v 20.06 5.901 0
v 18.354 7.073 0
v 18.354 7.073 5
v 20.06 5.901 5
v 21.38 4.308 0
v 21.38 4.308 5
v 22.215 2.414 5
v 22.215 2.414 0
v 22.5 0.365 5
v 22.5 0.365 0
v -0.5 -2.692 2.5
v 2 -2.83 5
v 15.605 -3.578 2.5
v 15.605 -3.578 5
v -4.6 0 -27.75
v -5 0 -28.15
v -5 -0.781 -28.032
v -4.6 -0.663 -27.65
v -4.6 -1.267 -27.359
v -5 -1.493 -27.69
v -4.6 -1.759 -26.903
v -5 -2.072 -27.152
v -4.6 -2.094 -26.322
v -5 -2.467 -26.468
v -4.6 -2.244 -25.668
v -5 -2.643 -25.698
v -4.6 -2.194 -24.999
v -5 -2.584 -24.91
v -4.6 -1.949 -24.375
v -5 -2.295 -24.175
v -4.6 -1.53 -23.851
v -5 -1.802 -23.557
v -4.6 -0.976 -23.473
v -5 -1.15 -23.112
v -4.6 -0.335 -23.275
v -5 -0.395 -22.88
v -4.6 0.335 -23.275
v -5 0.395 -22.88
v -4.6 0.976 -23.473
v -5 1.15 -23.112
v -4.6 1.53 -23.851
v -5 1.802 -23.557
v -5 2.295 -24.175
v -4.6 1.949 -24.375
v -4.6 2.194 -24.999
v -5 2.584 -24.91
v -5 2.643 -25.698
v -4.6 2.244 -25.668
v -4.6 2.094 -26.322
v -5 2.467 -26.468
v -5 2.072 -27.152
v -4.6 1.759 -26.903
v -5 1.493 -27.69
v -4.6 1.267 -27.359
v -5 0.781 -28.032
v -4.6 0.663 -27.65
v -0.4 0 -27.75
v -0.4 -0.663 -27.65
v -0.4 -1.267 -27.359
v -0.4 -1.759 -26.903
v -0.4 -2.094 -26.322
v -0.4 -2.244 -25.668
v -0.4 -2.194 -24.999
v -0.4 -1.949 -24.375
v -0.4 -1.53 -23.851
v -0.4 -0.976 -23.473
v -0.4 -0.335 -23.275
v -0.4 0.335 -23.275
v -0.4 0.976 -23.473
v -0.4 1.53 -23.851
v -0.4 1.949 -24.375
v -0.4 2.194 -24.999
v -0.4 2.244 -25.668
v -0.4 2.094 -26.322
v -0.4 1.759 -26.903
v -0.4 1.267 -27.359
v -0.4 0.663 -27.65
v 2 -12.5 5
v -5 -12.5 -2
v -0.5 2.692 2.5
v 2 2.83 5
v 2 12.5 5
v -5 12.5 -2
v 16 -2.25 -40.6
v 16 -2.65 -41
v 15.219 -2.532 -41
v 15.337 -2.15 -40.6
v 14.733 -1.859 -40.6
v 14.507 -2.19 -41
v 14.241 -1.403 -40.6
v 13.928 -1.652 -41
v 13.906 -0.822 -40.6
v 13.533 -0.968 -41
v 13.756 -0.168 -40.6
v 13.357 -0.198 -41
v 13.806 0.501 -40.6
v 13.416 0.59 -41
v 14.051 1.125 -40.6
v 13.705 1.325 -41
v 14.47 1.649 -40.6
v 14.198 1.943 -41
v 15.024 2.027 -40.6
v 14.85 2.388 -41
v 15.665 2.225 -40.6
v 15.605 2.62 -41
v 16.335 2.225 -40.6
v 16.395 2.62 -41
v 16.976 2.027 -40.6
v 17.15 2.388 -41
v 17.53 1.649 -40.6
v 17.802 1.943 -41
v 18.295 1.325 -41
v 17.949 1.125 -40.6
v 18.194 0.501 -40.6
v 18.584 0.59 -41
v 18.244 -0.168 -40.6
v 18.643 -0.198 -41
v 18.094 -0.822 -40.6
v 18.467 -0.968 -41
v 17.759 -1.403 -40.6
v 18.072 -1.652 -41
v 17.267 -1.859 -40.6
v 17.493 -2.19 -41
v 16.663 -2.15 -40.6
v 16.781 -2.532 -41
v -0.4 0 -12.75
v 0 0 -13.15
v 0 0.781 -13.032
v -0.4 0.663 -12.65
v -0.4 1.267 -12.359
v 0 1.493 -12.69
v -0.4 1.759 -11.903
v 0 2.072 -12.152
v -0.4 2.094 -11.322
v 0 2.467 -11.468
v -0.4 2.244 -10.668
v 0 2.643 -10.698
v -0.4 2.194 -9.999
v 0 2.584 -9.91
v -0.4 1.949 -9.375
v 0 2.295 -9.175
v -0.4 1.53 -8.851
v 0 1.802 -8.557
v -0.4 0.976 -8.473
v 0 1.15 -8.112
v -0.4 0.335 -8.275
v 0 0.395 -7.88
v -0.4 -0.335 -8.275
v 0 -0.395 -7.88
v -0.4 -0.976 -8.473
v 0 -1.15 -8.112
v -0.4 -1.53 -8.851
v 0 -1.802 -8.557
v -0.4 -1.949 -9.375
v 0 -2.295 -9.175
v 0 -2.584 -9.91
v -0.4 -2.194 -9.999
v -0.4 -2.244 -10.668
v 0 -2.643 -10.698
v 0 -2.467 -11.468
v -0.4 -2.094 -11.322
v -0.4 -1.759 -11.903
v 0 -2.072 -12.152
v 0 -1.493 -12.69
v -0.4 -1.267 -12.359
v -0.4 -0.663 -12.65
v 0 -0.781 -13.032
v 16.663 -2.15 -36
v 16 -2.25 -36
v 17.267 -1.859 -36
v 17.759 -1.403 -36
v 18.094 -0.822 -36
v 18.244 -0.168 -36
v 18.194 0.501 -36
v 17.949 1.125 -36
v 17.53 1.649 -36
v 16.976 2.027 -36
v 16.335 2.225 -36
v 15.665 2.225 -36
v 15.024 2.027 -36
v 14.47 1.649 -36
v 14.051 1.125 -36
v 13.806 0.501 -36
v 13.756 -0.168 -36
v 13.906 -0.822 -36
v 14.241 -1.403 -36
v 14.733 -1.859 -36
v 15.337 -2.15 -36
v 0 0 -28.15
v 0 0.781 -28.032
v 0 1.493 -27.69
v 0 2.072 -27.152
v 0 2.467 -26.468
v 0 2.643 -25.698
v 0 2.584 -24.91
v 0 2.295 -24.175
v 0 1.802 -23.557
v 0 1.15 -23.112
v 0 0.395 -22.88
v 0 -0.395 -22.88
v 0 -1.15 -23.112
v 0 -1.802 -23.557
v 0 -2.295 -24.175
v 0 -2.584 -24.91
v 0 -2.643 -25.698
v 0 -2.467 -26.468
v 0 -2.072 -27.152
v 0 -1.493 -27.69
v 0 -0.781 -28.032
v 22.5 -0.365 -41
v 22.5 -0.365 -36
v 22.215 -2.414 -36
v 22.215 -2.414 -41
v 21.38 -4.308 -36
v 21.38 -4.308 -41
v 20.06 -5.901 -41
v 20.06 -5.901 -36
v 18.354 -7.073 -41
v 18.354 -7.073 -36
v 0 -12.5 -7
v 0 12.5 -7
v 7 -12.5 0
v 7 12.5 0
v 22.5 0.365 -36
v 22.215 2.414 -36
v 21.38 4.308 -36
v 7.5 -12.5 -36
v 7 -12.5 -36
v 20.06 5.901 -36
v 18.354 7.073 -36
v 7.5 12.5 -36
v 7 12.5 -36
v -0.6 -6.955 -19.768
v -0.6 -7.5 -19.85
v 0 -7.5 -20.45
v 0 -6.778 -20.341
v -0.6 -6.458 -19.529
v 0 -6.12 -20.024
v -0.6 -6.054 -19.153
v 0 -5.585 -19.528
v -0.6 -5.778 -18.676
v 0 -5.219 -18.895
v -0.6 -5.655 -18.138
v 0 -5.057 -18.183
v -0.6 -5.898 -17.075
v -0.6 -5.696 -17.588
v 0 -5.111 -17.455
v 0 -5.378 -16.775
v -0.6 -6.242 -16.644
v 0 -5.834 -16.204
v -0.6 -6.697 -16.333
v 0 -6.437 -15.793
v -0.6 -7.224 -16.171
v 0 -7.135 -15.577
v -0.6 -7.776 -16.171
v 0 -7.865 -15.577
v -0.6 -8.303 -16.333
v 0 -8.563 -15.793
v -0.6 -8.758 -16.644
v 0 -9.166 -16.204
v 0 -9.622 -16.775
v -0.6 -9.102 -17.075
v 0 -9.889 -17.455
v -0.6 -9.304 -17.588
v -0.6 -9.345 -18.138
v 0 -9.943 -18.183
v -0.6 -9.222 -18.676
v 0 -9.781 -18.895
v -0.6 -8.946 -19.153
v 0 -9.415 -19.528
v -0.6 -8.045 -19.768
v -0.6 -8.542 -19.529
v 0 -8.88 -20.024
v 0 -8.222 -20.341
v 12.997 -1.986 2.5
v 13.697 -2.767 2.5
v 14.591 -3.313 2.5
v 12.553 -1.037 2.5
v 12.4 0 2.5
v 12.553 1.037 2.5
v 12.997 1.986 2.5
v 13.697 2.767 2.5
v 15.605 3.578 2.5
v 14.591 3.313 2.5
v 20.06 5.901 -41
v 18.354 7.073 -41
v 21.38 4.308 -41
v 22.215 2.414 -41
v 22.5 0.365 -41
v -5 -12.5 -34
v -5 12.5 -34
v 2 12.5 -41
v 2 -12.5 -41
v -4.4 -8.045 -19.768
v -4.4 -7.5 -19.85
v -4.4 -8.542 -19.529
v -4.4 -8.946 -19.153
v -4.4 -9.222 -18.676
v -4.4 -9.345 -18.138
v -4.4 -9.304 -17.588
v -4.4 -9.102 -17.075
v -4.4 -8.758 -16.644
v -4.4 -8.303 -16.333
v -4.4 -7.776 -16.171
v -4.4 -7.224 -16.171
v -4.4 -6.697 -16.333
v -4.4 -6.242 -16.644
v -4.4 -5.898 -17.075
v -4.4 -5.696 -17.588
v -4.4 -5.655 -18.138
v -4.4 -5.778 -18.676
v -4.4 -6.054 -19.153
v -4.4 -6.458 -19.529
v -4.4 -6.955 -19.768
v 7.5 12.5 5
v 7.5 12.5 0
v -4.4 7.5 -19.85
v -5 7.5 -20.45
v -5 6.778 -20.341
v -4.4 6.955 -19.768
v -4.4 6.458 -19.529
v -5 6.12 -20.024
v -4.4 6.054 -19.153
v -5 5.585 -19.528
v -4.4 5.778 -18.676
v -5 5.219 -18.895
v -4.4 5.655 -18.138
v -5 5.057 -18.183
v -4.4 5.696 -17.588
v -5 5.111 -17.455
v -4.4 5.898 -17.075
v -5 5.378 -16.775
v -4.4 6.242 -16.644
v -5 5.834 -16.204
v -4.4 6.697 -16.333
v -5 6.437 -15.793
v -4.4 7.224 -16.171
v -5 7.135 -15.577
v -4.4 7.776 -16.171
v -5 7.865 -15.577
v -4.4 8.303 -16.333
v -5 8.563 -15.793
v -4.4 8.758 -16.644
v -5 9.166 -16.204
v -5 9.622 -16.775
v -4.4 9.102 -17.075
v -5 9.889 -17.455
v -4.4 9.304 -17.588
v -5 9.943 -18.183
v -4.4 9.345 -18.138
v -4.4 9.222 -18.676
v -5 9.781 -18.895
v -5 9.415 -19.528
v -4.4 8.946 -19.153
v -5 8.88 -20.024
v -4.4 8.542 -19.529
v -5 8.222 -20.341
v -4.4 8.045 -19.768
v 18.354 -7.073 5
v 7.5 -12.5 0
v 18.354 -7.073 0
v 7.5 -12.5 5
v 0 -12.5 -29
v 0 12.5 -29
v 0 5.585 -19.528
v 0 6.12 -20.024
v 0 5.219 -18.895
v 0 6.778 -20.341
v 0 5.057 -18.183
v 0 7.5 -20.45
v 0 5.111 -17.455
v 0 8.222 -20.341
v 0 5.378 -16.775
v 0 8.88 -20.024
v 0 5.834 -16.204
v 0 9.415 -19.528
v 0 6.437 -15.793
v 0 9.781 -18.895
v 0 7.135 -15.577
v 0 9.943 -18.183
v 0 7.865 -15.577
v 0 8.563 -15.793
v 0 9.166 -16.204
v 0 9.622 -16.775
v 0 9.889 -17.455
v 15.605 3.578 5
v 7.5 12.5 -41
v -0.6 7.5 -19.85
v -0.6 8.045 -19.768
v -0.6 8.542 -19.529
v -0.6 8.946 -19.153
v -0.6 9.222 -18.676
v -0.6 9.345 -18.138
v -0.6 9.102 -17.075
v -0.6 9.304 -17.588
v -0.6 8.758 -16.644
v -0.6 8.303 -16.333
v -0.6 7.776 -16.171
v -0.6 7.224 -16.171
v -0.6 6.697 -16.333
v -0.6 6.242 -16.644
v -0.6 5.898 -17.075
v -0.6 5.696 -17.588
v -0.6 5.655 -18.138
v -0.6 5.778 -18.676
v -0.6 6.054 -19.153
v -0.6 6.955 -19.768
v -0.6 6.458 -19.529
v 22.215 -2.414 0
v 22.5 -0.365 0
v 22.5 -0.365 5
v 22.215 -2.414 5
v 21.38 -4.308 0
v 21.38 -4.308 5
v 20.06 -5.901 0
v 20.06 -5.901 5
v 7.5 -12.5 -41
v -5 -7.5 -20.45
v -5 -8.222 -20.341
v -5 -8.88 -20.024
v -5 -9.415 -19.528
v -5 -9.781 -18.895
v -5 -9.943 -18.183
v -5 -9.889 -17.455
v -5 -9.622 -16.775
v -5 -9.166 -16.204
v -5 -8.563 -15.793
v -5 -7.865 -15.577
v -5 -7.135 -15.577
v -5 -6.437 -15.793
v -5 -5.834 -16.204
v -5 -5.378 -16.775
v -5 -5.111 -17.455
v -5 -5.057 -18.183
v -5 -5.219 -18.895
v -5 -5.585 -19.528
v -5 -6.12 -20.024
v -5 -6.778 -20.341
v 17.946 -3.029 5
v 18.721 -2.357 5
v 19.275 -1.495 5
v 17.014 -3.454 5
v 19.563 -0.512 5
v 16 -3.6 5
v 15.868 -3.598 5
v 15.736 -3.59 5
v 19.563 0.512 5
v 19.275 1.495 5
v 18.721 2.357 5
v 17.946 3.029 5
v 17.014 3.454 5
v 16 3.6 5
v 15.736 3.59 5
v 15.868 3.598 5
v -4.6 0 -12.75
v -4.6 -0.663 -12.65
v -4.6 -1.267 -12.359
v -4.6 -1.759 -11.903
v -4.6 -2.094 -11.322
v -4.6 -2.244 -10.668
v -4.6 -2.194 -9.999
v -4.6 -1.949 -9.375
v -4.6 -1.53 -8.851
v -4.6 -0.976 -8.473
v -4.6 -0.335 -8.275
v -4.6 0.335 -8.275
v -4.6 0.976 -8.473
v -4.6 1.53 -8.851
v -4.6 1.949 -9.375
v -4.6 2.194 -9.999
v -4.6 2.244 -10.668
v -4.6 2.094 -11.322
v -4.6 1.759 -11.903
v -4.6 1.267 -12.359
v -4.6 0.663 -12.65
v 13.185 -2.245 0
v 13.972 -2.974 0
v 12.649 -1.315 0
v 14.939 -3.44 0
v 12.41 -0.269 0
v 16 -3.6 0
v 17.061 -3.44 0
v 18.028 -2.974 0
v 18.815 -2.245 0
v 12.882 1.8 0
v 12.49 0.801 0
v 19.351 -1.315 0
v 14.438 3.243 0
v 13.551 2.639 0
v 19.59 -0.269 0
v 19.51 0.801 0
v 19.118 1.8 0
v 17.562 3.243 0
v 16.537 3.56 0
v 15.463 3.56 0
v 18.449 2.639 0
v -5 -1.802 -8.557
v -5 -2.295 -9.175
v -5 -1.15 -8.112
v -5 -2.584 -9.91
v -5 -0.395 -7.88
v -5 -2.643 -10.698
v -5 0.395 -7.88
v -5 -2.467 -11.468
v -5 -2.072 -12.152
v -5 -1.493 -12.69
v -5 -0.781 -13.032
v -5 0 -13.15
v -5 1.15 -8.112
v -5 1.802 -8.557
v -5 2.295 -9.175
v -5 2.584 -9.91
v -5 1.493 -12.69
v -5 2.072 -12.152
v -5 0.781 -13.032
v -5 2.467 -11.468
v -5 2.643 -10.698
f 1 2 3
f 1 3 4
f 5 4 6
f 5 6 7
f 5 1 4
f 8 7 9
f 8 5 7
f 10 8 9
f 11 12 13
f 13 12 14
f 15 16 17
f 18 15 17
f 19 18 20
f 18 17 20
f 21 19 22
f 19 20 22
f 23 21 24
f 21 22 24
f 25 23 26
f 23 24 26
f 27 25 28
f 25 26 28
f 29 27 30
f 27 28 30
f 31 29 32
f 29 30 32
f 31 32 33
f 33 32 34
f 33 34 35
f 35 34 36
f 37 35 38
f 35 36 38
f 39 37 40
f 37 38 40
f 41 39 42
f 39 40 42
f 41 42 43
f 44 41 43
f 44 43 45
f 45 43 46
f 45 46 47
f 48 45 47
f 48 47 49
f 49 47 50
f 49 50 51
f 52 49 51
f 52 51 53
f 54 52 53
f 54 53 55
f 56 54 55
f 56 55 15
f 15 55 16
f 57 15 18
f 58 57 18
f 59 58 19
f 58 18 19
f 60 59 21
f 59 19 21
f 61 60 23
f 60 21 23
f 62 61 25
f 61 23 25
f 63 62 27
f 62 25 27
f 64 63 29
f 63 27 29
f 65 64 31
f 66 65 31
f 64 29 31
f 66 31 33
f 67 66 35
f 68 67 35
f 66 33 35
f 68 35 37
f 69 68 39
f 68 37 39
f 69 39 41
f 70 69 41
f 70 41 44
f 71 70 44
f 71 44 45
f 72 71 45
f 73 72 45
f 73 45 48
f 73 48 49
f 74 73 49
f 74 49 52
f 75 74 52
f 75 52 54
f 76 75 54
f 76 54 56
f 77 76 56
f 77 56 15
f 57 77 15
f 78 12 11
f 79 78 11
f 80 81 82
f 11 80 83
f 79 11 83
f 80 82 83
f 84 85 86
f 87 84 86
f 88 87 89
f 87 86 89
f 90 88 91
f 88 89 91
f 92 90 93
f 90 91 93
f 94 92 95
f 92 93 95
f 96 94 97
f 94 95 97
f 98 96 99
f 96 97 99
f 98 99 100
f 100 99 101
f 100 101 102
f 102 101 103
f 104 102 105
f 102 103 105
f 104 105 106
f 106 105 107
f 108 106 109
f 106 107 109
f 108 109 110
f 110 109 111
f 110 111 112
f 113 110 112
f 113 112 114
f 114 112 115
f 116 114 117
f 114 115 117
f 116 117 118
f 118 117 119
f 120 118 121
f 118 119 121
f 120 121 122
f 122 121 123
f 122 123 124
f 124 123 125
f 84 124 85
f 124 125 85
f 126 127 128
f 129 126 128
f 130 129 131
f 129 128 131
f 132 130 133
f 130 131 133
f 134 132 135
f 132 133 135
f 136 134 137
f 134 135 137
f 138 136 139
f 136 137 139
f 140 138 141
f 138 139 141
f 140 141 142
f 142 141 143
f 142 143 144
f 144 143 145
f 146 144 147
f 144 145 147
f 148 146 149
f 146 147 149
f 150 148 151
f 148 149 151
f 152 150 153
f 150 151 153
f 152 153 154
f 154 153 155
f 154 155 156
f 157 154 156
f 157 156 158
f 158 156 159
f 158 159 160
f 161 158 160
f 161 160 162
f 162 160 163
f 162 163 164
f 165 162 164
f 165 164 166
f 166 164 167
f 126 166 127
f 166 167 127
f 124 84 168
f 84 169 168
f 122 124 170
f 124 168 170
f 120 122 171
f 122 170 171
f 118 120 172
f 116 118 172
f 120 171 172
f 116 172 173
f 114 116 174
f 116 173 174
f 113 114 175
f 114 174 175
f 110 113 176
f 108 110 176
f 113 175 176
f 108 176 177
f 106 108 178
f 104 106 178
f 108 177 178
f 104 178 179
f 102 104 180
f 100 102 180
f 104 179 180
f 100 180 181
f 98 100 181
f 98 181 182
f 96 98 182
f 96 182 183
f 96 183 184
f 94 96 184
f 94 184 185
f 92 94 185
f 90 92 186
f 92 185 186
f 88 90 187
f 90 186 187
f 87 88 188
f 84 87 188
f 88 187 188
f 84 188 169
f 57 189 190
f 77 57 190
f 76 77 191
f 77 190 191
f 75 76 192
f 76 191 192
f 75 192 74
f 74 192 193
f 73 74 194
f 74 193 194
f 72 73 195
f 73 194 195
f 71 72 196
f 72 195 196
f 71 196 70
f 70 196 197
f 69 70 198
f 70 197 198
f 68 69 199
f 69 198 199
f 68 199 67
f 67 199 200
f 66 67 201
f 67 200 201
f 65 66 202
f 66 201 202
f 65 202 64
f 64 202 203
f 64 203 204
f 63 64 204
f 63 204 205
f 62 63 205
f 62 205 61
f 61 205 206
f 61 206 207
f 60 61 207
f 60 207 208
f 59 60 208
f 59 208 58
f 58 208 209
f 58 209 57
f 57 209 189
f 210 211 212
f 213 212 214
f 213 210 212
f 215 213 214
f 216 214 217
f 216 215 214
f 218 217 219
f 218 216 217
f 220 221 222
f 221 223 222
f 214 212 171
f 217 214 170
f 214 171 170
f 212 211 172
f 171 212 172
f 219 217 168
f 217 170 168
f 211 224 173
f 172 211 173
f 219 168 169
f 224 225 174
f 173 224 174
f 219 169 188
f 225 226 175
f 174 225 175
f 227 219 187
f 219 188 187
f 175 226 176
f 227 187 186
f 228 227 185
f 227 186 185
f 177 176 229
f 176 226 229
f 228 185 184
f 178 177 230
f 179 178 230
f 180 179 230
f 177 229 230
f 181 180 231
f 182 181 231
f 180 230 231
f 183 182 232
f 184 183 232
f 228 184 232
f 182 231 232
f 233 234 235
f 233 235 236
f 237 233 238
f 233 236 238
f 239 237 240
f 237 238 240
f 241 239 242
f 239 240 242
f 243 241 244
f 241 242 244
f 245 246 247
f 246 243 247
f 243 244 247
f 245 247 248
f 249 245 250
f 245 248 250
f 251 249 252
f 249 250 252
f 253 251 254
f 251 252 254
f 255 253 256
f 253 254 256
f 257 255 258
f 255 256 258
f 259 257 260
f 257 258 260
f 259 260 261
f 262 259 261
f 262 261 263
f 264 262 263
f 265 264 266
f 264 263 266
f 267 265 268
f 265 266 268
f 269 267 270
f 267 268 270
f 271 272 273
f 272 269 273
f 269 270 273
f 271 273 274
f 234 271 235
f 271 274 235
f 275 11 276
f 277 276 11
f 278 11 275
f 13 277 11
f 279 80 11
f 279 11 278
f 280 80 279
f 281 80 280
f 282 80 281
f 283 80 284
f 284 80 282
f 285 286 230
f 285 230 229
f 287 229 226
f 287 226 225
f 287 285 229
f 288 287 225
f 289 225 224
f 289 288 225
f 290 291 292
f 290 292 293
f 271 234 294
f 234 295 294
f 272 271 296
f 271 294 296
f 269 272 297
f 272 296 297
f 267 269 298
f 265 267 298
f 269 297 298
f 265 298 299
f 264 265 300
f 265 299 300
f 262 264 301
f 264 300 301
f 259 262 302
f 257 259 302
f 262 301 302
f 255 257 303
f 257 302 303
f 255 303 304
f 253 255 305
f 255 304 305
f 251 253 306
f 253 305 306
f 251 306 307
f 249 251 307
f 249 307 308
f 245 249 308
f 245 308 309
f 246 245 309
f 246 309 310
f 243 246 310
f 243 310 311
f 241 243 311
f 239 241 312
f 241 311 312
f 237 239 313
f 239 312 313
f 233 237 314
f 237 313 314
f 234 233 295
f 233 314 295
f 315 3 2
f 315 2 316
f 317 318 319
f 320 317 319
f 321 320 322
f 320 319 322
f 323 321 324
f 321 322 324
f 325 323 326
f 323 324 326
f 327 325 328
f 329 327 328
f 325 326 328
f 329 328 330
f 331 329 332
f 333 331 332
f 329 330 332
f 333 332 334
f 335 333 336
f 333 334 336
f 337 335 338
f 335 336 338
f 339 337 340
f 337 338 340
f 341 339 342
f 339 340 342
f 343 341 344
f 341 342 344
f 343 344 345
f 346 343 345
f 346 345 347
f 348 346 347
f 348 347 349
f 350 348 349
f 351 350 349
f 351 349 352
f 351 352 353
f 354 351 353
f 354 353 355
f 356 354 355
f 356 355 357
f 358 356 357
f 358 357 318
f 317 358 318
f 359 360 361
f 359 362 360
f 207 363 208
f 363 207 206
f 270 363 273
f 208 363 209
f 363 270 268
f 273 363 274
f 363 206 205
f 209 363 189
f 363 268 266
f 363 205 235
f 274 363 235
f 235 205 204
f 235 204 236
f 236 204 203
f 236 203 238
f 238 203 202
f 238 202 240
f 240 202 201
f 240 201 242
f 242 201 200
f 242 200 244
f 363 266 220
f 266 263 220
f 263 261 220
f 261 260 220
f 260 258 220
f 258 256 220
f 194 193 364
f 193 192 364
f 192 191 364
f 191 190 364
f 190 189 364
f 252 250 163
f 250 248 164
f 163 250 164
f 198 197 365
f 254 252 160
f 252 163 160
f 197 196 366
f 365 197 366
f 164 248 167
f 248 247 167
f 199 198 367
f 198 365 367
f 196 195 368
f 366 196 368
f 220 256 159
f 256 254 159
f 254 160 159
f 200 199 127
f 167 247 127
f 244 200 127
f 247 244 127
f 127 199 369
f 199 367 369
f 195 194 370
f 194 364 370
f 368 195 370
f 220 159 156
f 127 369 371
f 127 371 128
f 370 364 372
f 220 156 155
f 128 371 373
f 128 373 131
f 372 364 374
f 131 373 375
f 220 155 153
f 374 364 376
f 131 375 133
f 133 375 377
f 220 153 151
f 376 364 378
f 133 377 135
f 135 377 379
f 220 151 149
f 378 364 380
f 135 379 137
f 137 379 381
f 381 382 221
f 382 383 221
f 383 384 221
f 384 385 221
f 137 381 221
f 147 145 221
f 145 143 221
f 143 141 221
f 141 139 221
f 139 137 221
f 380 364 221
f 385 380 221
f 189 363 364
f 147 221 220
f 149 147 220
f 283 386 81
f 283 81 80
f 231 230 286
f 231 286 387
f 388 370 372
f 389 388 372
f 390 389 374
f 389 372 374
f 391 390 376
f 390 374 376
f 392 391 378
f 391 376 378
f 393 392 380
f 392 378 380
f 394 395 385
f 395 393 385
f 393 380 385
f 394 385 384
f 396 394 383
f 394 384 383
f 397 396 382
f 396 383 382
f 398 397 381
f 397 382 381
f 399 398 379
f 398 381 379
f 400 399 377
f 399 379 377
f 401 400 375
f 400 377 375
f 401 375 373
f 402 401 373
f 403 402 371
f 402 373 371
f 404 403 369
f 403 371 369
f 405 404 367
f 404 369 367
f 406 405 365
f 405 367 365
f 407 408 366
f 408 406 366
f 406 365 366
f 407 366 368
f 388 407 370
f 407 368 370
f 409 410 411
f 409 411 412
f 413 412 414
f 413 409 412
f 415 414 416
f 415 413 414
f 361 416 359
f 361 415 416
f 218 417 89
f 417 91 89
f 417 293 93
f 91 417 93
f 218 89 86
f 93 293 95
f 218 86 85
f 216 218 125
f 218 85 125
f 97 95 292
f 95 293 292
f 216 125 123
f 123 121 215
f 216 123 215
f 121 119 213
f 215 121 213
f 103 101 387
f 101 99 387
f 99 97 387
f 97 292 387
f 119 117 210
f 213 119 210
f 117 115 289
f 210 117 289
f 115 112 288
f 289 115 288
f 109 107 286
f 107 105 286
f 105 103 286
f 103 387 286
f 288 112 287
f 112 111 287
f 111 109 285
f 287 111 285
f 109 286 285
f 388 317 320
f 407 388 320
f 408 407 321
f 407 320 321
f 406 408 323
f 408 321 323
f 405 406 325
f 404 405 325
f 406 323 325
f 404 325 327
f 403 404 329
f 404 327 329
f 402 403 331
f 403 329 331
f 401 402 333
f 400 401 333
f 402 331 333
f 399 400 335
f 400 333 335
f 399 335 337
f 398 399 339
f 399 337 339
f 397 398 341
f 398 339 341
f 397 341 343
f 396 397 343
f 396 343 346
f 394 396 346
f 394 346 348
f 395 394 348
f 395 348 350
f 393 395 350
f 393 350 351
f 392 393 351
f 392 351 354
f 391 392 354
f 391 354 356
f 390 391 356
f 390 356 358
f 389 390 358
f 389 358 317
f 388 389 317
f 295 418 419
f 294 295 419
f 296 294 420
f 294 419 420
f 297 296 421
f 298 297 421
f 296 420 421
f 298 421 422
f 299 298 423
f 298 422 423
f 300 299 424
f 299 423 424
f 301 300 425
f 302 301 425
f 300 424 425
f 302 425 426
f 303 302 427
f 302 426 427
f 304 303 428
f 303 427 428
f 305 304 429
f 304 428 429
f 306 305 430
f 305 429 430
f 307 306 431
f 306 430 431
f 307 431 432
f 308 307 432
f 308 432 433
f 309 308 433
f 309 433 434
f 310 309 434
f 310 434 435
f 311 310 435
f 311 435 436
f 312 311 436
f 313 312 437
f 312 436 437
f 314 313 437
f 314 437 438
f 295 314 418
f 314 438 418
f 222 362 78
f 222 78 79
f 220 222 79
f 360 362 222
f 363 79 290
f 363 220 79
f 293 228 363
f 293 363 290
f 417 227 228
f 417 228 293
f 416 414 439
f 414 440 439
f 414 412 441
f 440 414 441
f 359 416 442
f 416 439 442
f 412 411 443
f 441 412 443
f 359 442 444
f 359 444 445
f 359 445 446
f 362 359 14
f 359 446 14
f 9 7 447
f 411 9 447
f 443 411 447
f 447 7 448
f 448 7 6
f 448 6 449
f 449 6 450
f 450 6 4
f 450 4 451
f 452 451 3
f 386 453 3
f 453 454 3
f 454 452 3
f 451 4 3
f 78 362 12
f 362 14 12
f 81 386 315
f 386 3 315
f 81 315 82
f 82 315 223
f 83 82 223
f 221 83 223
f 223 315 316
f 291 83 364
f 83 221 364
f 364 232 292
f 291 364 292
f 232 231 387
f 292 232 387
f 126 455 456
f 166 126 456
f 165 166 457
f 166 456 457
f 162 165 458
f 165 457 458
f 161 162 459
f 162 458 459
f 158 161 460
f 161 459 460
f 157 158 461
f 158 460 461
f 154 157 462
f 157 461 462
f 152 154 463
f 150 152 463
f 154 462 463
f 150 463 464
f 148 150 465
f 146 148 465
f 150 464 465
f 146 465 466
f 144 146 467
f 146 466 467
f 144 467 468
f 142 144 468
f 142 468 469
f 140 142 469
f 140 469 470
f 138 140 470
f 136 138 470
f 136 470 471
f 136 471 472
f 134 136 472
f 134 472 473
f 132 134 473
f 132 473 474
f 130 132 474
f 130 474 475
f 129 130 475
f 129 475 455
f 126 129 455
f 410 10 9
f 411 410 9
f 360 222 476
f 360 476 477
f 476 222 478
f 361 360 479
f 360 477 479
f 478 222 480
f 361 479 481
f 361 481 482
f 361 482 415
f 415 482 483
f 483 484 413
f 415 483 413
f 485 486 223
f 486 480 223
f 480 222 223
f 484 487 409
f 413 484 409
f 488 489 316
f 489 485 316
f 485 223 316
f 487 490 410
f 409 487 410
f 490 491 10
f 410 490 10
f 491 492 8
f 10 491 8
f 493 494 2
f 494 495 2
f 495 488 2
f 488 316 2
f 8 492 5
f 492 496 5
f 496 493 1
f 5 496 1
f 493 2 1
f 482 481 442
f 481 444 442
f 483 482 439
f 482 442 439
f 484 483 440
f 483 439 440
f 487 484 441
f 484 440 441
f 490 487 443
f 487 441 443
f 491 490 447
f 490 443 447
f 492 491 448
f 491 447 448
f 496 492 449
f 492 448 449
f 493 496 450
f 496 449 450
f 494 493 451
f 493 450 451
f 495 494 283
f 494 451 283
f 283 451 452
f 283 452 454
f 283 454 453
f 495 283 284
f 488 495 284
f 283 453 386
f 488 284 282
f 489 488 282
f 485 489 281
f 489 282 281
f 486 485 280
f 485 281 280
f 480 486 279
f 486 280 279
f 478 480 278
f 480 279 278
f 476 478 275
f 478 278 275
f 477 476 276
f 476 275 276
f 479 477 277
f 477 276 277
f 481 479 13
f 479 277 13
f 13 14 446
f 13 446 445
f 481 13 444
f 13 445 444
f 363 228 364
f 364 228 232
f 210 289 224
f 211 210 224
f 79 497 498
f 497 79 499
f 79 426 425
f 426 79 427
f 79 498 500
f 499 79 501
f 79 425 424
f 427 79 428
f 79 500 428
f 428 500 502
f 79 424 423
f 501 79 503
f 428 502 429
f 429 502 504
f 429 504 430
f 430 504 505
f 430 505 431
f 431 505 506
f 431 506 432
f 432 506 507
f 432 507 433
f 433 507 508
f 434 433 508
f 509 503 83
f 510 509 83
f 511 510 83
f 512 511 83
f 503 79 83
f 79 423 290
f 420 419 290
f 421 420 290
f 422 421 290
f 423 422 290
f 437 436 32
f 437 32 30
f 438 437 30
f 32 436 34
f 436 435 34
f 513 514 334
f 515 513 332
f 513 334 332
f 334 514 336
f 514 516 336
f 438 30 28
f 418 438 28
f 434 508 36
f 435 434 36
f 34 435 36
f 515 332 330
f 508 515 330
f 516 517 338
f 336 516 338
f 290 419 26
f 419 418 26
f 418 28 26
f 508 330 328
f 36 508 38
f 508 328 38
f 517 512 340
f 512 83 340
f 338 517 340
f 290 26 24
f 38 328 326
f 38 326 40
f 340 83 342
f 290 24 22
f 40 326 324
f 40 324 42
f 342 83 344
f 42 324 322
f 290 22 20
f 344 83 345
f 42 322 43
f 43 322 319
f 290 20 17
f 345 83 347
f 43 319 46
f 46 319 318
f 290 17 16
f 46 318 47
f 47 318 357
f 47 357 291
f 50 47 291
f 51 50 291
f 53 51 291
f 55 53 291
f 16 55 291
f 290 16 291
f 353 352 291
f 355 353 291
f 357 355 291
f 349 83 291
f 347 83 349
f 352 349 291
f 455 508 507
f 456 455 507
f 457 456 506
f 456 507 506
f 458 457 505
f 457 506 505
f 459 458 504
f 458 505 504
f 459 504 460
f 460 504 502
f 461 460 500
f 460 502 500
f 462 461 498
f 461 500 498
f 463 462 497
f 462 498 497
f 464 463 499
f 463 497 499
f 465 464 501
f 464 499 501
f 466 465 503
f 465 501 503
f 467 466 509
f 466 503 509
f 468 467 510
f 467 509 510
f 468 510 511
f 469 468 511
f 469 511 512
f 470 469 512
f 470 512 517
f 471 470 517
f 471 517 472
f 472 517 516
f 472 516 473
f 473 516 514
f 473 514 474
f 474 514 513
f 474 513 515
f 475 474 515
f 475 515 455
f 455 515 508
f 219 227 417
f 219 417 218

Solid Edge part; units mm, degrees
sketch "Sketch1" plane through (0, 0, 0) normal (0, -1, 0) x (1, 0, 0)
  line L0 (0, 0) -> (22.5, 0)
  line L1 (22.5, 0) -> (22.5, 5)
  line L2 (22.5, 5) -> (-5, 5)
  line L3 (-5, 5) -> (-5, -41)
  line L4 (-5, -41) -> (22.5, -41)
  line L5 (22.5, -41) -> (22.5, -36)
  line L6 (22.5, -36) -> (0, -36)
  line L7 (0, -36) -> (0, 0)
  dimension "D1" = 27.5
  dimension "D2" = 22.5
  dimension "D3" = 5
  dimension "D4" = 5
  dimension "D5" = 36
extrude "Protrusion1" add sketch "Sketch1" along normal mid plane 25
sketch "Sketch2" plane through (7.5, 0, 5) normal (0, 0, 1) x (0, 1, 0)
  line L0 (-12.5, 0) -> (-5, -15)
  line L1 (-5, -15) -> (5, -15)
  line L2 (5, -15) -> (12.5, 0)
  line L3 (12.5, 0) -> (12.5, -17.5)
  line L4 (12.5, -17.5) -> (-12.5, -17.5)
  line L5 (-12.5, -17.5) -> (-12.5, 0)
  dimension "D1" = 15
  dimension "D2" = 10
  dimension "D3" = 2.5
extrude "Cutout1" cut sketch "Sketch2" against normal through all
fillet "coned_rounding" radius 7.5 4 edges at (22.5, -5, 2.5) (22.5, 5, 2.5) (22.5, -5, -38.5) (22.5, 5, -38.5)
hole "Hole_2" at (16, 0, 5) direction (0, 0, -1) diameter 4.5 end through all start chamfer 0.4 start chamfer angle 45 end chamfer 0.4 end chamfer angle 45
hole "Hole_3" at (16, 0, 5) direction (0, 0, -1) diameter 7.2 end up to next
sketch "Sketch3" plane through (7.5, 0, 5) normal (0, 0, 1) x (0, 1, 0)
  line L0 (-3.6, -8.5) -> (3.6, -8.5)
  line L1 (3.6, -8.5) -> (2.4993, 11.5)
  line L2 (2.4993, 11.5) -> (-2.4993, 11.5)
  line L3 (-2.4993, 11.5) -> (-3.6, -8.5)
  dimension "D1" = 20
extrude "ExtrudedCutout_2" cut sketch "Sketch3" against normal blind 2.5
hole "Hole1" at (0, 0, -25.5) direction (-1, 0, 0) diameter 4.5 depth 30 tip angle 118 start chamfer 0.4 start chamfer angle 45 end chamfer 0.4 end chamfer angle 45
hole "Hole2" at (0, 0, -10.5) direction (-1, 0, 0) diameter 4.5 depth 30 tip angle 118 start chamfer 0.4 start chamfer angle 45 end chamfer 0.4 end chamfer angle 45
hole "Hole_8" at (0, -7.5, -18) direction (-1, 0, 0) diameter 3.7 depth 30 tip angle 118 start chamfer 0.6 start chamfer angle 45 end chamfer 0.6 end chamfer angle 45
hole "Hole3" at (0, 7.5, -18) direction (-1, 0, 0) diameter 3.7 depth 30 tip angle 118 start chamfer 0.6 start chamfer angle 45 end chamfer 0.6 end chamfer angle 45
chamfer "Chamfer_1" distance 7 angle 45 4 edges at (0, 0, -36) (-5, 0, -41) (0, 0, 0) (-5, 0, 5)
properties material "Polypropylene, general purpose"
